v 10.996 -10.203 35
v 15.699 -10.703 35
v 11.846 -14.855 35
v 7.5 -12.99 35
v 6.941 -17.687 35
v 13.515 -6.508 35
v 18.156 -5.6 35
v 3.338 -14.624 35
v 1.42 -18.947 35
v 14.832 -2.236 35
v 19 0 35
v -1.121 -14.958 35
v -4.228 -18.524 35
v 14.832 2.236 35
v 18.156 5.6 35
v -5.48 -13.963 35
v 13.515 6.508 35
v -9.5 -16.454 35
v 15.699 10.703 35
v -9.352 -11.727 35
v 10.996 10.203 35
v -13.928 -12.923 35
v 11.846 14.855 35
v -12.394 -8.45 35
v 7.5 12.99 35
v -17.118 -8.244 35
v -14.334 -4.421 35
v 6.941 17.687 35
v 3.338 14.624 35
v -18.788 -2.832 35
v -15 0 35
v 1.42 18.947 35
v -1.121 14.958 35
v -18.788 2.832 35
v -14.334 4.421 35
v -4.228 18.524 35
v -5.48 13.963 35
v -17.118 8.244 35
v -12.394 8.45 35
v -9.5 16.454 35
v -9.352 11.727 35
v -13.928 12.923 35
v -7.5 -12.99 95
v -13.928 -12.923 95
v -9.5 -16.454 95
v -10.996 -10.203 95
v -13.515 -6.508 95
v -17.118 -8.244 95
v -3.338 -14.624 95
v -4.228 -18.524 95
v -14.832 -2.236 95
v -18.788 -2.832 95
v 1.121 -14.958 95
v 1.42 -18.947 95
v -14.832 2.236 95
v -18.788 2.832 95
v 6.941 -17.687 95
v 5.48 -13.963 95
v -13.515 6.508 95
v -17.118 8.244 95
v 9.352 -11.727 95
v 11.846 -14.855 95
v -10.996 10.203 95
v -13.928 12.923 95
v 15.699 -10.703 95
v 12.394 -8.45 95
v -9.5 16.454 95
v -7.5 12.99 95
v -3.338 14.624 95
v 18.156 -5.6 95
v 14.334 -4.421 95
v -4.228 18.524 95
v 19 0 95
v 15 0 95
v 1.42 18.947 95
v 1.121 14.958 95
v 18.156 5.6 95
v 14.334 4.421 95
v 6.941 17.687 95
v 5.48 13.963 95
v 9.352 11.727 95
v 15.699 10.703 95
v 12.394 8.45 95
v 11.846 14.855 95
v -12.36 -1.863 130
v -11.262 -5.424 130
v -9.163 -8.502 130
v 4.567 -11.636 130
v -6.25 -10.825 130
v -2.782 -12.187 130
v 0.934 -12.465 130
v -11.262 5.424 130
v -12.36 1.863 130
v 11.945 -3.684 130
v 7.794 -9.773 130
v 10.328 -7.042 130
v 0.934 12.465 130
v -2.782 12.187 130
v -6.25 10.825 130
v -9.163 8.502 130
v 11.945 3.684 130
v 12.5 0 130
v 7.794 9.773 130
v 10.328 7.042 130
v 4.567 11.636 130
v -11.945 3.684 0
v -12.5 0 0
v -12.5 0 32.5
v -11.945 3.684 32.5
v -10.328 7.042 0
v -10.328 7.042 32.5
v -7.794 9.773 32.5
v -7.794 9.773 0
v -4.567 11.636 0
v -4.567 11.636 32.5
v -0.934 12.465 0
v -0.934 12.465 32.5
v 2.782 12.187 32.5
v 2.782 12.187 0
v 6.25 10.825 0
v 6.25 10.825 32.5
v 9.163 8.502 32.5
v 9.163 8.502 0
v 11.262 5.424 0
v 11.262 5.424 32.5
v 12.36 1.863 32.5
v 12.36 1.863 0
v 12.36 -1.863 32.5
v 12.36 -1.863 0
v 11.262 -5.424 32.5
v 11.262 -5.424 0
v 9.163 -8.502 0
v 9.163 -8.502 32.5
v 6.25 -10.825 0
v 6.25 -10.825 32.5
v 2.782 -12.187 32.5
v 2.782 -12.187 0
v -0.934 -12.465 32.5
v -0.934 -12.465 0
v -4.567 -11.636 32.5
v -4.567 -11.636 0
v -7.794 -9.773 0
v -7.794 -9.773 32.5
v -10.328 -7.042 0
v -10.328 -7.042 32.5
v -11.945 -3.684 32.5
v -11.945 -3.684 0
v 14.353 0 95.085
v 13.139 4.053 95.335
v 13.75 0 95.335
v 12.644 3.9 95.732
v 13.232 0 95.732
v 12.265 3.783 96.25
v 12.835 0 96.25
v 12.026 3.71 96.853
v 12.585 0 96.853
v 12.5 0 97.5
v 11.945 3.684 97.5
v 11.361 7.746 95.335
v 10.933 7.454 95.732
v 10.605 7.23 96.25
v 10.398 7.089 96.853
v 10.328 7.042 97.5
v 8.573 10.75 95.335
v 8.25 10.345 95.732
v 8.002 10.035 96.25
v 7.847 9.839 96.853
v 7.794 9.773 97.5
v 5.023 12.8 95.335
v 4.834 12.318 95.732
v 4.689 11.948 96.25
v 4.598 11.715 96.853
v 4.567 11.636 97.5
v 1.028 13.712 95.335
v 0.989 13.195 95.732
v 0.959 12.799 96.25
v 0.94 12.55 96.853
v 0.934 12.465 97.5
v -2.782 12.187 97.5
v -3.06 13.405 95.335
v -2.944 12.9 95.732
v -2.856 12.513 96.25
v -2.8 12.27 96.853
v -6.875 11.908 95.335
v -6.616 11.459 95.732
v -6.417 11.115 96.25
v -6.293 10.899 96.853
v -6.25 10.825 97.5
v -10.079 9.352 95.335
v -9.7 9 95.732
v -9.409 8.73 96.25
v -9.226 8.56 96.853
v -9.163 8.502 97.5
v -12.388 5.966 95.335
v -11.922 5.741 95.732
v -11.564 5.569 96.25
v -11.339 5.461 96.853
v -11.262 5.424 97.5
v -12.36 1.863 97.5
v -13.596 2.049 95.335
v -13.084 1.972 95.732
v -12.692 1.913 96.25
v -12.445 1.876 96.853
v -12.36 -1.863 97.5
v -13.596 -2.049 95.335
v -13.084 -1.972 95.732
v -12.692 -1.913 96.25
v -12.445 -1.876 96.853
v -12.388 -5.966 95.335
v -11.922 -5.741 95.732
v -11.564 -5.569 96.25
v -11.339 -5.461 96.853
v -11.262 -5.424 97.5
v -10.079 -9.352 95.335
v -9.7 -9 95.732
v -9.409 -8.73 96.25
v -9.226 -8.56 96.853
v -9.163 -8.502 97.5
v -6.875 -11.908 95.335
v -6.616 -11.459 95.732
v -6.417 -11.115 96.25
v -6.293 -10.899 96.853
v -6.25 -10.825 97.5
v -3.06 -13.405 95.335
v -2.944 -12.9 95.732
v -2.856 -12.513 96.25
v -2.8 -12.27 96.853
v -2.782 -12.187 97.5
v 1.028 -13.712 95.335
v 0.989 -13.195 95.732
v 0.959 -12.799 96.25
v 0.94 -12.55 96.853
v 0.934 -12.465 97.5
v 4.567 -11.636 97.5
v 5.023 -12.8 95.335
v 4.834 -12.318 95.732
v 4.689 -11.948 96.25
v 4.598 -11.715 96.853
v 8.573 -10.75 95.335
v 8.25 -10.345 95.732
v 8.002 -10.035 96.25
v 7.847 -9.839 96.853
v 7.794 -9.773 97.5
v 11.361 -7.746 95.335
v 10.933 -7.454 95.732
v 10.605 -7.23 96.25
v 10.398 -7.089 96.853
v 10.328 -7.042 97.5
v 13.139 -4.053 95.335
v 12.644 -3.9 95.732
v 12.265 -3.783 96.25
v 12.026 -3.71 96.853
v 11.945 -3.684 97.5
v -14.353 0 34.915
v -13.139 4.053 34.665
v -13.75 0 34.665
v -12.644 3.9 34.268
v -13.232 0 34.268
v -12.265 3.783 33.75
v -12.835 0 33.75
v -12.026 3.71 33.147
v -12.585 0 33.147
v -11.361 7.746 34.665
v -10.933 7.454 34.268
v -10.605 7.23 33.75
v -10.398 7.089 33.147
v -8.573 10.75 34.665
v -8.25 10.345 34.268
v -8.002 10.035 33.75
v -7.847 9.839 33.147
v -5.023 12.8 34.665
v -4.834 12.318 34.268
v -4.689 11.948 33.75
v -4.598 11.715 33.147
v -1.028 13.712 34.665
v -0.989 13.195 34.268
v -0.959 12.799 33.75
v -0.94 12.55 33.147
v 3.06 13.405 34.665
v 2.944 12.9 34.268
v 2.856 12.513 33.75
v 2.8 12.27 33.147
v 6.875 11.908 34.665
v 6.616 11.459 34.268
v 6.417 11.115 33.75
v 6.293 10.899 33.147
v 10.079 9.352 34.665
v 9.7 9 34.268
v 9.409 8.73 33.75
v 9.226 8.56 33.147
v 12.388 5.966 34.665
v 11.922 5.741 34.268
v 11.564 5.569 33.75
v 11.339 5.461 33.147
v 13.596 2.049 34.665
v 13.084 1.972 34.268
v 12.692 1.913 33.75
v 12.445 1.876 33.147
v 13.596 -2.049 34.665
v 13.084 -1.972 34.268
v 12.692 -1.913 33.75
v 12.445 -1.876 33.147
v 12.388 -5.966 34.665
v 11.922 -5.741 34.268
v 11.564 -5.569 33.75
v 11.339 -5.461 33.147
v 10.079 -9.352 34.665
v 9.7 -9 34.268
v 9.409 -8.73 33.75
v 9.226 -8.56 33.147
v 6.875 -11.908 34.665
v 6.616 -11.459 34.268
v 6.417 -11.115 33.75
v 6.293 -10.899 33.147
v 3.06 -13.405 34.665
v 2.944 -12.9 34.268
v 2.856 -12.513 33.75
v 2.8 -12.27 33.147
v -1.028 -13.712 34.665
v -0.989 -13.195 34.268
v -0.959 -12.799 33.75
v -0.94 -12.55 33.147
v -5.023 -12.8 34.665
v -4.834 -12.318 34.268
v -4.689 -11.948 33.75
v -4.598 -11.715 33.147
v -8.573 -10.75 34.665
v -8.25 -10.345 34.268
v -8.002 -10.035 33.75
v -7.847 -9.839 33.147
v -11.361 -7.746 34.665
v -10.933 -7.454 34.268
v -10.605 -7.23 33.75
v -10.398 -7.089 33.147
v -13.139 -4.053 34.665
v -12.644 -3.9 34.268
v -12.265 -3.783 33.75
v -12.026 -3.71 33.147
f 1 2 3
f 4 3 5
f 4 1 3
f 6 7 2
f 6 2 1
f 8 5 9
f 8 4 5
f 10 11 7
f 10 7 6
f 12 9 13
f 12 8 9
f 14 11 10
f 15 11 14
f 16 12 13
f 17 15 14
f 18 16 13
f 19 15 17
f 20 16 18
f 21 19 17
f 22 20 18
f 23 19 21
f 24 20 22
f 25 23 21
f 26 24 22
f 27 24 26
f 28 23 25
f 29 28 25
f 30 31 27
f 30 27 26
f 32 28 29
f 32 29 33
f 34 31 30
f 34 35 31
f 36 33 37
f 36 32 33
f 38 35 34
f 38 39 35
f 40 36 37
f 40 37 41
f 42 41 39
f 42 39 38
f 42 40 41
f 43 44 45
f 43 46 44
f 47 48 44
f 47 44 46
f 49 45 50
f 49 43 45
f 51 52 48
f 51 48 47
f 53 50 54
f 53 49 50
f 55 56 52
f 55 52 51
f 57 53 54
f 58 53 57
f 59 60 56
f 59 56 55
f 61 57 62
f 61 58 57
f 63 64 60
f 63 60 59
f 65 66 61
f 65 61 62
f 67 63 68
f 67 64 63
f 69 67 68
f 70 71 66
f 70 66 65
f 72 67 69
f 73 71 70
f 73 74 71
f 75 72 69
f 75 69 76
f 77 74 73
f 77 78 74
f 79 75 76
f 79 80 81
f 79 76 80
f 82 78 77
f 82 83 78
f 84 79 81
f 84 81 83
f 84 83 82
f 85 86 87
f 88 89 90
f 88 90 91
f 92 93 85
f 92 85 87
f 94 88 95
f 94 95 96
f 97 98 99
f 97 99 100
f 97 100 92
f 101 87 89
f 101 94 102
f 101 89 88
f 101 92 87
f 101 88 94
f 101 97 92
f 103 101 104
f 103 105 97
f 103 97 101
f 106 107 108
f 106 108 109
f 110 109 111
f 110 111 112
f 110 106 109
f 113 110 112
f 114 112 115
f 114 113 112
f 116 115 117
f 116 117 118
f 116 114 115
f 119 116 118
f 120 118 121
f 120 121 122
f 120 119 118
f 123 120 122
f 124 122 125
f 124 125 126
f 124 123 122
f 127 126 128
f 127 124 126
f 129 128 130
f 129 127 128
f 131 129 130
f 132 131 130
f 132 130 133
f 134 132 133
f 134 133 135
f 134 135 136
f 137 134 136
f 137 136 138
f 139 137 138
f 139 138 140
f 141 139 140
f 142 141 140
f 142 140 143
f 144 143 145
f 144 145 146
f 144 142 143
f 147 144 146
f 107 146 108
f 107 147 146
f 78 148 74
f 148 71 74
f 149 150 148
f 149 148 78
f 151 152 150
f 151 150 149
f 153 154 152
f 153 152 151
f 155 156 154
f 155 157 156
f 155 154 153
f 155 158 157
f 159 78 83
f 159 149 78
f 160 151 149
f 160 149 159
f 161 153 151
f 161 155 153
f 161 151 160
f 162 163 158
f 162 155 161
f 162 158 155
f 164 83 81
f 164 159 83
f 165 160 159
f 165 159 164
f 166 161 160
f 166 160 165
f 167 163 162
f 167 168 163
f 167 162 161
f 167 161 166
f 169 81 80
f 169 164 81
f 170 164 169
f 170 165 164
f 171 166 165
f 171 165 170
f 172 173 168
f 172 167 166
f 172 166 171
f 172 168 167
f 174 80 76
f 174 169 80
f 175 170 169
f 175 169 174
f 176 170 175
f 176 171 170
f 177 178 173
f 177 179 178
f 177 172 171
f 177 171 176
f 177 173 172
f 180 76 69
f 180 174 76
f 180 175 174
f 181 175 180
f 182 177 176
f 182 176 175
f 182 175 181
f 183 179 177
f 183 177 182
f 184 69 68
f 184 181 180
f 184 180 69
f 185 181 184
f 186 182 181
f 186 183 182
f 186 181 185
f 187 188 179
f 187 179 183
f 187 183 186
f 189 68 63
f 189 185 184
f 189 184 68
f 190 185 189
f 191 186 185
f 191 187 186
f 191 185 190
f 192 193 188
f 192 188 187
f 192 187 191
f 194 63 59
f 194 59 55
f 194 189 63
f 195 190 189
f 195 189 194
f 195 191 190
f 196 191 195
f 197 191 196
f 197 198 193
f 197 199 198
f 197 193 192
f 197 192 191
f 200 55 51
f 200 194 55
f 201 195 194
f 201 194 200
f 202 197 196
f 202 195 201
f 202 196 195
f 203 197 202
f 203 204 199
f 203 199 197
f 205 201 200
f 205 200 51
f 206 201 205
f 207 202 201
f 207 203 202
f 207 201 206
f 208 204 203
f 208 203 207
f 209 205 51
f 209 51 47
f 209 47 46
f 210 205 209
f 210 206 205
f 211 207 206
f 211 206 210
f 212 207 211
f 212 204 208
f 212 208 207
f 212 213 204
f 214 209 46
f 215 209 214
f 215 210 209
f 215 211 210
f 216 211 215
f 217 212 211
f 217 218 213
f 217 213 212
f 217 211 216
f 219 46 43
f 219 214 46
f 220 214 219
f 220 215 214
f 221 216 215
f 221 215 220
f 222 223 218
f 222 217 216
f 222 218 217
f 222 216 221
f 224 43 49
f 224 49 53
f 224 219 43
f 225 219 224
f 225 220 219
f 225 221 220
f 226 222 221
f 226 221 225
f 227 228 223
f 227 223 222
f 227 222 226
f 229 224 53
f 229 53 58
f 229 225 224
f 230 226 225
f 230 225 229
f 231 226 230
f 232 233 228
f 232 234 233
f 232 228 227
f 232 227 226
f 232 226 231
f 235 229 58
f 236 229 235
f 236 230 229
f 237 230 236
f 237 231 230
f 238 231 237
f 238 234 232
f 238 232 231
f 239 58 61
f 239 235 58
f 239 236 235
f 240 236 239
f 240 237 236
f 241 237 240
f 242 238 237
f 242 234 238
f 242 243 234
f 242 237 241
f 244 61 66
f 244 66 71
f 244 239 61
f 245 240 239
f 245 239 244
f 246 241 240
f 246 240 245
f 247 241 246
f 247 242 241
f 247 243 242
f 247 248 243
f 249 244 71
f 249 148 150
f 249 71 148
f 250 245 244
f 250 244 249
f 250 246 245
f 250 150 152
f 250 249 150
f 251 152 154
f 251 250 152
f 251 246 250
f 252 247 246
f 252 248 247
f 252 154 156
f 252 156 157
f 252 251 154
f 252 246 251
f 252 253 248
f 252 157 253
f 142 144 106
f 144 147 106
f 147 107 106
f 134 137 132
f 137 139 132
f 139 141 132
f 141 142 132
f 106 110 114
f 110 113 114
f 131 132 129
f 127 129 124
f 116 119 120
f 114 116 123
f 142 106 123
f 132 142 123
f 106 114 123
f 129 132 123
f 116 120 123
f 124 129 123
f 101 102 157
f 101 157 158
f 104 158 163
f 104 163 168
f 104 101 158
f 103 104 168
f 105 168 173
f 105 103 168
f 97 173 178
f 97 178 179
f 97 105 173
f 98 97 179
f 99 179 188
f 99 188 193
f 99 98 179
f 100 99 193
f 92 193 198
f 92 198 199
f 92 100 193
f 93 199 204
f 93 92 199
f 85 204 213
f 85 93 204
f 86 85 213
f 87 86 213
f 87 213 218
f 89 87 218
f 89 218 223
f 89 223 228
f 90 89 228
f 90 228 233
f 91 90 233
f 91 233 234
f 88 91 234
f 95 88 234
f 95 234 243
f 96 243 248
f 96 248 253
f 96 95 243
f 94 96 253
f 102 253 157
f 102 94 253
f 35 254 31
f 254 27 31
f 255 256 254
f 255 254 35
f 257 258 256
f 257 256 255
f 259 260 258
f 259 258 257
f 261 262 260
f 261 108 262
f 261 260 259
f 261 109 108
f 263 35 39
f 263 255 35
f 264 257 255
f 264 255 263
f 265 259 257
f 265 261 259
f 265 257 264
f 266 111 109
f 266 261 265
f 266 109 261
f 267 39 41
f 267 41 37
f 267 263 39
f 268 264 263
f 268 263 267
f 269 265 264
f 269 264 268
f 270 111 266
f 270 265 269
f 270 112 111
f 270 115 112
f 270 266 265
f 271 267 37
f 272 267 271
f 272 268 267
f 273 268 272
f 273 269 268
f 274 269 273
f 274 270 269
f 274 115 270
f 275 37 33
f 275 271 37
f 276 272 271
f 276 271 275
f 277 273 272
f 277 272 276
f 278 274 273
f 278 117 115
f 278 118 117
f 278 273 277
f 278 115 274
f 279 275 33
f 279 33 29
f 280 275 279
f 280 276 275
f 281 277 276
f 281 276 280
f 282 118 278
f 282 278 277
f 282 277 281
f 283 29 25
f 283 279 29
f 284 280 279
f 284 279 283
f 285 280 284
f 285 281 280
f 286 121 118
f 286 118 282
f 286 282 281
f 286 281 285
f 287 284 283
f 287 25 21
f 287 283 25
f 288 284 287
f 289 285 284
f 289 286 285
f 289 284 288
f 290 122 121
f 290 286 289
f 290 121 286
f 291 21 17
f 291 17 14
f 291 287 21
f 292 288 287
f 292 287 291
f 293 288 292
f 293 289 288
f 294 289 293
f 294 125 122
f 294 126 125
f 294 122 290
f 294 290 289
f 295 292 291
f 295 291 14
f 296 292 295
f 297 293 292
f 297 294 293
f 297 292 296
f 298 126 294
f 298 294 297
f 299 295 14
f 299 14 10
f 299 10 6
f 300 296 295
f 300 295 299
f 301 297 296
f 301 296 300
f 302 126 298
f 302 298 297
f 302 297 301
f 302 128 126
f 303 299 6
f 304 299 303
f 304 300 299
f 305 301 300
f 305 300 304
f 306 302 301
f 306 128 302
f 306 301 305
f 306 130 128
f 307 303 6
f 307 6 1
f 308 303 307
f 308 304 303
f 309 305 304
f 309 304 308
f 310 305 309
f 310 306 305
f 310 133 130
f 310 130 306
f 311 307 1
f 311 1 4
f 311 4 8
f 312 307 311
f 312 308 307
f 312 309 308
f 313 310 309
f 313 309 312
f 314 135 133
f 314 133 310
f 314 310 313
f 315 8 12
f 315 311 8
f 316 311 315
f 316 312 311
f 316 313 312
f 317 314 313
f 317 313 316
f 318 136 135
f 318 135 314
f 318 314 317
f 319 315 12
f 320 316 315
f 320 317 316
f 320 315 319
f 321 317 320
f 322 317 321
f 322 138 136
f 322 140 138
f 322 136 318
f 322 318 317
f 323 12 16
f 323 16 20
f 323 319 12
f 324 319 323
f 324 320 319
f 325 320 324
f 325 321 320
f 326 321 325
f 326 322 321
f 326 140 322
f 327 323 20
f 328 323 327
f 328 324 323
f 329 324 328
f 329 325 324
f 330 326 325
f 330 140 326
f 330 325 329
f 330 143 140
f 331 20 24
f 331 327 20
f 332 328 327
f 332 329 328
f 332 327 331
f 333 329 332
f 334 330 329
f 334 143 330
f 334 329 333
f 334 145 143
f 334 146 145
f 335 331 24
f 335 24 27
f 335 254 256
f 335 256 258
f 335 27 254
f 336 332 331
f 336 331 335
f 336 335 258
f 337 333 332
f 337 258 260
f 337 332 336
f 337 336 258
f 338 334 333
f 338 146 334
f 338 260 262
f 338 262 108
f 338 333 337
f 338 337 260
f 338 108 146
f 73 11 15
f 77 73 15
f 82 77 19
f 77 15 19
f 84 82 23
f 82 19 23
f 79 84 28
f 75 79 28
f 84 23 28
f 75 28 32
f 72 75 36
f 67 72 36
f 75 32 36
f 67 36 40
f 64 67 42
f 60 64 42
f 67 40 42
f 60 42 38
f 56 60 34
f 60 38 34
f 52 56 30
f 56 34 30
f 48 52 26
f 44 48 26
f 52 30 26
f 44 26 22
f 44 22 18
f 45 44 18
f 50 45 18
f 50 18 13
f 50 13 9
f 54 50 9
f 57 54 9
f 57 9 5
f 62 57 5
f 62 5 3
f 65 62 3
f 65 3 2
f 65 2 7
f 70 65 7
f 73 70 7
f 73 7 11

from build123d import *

# Parameters (mm, degrees)
SKETCH1_R           = 19
BOSS_EXTRUDE1_DEPTH = 130
SKETCH2_R           = 19
SKETCH2_R_2         = 12.5
CUT_EXTRUDE2_DEPTH  = 35
SKETCH3_R           = 19
SKETCH3_R_2         = 12.5
CUT_EXTRUDE3_DEPTH  = 35
FILLET1_R           = 2.5


with BuildPart() as part:
    # Sketch1 → Boss-Extrude1 (new body)
    with BuildSketch(Plane.XY):
        Circle(SKETCH1_R)
    extrude(amount=BOSS_EXTRUDE1_DEPTH)

    # Sketch2 → Cut-Extrude2 (cut)
    with BuildSketch(Plane.XY.offset(130)):
        Circle(SKETCH2_R)
        Circle(SKETCH2_R_2, mode=Mode.SUBTRACT)
    extrude(amount=-CUT_EXTRUDE2_DEPTH, mode=Mode.SUBTRACT)

    # Sketch3 → Cut-Extrude3 (cut)
    with BuildSketch(Plane(origin=(0, 0, 0), x_dir=(-1, 0, 0), z_dir=(0, 0, -1))):
        Circle(SKETCH3_R)
        Circle(SKETCH3_R_2, mode=Mode.SUBTRACT)
    extrude(amount=-CUT_EXTRUDE3_DEPTH, mode=Mode.SUBTRACT)

    # Fillet1
    fillet1_edges = [part.edges().sort_by_distance(p)[0] for p in [
        (12.5, 0, 35),
        (-12.5, 0, 95),
    ]]
    fillet(fillet1_edges, radius=FILLET1_R)


solid = part.part
